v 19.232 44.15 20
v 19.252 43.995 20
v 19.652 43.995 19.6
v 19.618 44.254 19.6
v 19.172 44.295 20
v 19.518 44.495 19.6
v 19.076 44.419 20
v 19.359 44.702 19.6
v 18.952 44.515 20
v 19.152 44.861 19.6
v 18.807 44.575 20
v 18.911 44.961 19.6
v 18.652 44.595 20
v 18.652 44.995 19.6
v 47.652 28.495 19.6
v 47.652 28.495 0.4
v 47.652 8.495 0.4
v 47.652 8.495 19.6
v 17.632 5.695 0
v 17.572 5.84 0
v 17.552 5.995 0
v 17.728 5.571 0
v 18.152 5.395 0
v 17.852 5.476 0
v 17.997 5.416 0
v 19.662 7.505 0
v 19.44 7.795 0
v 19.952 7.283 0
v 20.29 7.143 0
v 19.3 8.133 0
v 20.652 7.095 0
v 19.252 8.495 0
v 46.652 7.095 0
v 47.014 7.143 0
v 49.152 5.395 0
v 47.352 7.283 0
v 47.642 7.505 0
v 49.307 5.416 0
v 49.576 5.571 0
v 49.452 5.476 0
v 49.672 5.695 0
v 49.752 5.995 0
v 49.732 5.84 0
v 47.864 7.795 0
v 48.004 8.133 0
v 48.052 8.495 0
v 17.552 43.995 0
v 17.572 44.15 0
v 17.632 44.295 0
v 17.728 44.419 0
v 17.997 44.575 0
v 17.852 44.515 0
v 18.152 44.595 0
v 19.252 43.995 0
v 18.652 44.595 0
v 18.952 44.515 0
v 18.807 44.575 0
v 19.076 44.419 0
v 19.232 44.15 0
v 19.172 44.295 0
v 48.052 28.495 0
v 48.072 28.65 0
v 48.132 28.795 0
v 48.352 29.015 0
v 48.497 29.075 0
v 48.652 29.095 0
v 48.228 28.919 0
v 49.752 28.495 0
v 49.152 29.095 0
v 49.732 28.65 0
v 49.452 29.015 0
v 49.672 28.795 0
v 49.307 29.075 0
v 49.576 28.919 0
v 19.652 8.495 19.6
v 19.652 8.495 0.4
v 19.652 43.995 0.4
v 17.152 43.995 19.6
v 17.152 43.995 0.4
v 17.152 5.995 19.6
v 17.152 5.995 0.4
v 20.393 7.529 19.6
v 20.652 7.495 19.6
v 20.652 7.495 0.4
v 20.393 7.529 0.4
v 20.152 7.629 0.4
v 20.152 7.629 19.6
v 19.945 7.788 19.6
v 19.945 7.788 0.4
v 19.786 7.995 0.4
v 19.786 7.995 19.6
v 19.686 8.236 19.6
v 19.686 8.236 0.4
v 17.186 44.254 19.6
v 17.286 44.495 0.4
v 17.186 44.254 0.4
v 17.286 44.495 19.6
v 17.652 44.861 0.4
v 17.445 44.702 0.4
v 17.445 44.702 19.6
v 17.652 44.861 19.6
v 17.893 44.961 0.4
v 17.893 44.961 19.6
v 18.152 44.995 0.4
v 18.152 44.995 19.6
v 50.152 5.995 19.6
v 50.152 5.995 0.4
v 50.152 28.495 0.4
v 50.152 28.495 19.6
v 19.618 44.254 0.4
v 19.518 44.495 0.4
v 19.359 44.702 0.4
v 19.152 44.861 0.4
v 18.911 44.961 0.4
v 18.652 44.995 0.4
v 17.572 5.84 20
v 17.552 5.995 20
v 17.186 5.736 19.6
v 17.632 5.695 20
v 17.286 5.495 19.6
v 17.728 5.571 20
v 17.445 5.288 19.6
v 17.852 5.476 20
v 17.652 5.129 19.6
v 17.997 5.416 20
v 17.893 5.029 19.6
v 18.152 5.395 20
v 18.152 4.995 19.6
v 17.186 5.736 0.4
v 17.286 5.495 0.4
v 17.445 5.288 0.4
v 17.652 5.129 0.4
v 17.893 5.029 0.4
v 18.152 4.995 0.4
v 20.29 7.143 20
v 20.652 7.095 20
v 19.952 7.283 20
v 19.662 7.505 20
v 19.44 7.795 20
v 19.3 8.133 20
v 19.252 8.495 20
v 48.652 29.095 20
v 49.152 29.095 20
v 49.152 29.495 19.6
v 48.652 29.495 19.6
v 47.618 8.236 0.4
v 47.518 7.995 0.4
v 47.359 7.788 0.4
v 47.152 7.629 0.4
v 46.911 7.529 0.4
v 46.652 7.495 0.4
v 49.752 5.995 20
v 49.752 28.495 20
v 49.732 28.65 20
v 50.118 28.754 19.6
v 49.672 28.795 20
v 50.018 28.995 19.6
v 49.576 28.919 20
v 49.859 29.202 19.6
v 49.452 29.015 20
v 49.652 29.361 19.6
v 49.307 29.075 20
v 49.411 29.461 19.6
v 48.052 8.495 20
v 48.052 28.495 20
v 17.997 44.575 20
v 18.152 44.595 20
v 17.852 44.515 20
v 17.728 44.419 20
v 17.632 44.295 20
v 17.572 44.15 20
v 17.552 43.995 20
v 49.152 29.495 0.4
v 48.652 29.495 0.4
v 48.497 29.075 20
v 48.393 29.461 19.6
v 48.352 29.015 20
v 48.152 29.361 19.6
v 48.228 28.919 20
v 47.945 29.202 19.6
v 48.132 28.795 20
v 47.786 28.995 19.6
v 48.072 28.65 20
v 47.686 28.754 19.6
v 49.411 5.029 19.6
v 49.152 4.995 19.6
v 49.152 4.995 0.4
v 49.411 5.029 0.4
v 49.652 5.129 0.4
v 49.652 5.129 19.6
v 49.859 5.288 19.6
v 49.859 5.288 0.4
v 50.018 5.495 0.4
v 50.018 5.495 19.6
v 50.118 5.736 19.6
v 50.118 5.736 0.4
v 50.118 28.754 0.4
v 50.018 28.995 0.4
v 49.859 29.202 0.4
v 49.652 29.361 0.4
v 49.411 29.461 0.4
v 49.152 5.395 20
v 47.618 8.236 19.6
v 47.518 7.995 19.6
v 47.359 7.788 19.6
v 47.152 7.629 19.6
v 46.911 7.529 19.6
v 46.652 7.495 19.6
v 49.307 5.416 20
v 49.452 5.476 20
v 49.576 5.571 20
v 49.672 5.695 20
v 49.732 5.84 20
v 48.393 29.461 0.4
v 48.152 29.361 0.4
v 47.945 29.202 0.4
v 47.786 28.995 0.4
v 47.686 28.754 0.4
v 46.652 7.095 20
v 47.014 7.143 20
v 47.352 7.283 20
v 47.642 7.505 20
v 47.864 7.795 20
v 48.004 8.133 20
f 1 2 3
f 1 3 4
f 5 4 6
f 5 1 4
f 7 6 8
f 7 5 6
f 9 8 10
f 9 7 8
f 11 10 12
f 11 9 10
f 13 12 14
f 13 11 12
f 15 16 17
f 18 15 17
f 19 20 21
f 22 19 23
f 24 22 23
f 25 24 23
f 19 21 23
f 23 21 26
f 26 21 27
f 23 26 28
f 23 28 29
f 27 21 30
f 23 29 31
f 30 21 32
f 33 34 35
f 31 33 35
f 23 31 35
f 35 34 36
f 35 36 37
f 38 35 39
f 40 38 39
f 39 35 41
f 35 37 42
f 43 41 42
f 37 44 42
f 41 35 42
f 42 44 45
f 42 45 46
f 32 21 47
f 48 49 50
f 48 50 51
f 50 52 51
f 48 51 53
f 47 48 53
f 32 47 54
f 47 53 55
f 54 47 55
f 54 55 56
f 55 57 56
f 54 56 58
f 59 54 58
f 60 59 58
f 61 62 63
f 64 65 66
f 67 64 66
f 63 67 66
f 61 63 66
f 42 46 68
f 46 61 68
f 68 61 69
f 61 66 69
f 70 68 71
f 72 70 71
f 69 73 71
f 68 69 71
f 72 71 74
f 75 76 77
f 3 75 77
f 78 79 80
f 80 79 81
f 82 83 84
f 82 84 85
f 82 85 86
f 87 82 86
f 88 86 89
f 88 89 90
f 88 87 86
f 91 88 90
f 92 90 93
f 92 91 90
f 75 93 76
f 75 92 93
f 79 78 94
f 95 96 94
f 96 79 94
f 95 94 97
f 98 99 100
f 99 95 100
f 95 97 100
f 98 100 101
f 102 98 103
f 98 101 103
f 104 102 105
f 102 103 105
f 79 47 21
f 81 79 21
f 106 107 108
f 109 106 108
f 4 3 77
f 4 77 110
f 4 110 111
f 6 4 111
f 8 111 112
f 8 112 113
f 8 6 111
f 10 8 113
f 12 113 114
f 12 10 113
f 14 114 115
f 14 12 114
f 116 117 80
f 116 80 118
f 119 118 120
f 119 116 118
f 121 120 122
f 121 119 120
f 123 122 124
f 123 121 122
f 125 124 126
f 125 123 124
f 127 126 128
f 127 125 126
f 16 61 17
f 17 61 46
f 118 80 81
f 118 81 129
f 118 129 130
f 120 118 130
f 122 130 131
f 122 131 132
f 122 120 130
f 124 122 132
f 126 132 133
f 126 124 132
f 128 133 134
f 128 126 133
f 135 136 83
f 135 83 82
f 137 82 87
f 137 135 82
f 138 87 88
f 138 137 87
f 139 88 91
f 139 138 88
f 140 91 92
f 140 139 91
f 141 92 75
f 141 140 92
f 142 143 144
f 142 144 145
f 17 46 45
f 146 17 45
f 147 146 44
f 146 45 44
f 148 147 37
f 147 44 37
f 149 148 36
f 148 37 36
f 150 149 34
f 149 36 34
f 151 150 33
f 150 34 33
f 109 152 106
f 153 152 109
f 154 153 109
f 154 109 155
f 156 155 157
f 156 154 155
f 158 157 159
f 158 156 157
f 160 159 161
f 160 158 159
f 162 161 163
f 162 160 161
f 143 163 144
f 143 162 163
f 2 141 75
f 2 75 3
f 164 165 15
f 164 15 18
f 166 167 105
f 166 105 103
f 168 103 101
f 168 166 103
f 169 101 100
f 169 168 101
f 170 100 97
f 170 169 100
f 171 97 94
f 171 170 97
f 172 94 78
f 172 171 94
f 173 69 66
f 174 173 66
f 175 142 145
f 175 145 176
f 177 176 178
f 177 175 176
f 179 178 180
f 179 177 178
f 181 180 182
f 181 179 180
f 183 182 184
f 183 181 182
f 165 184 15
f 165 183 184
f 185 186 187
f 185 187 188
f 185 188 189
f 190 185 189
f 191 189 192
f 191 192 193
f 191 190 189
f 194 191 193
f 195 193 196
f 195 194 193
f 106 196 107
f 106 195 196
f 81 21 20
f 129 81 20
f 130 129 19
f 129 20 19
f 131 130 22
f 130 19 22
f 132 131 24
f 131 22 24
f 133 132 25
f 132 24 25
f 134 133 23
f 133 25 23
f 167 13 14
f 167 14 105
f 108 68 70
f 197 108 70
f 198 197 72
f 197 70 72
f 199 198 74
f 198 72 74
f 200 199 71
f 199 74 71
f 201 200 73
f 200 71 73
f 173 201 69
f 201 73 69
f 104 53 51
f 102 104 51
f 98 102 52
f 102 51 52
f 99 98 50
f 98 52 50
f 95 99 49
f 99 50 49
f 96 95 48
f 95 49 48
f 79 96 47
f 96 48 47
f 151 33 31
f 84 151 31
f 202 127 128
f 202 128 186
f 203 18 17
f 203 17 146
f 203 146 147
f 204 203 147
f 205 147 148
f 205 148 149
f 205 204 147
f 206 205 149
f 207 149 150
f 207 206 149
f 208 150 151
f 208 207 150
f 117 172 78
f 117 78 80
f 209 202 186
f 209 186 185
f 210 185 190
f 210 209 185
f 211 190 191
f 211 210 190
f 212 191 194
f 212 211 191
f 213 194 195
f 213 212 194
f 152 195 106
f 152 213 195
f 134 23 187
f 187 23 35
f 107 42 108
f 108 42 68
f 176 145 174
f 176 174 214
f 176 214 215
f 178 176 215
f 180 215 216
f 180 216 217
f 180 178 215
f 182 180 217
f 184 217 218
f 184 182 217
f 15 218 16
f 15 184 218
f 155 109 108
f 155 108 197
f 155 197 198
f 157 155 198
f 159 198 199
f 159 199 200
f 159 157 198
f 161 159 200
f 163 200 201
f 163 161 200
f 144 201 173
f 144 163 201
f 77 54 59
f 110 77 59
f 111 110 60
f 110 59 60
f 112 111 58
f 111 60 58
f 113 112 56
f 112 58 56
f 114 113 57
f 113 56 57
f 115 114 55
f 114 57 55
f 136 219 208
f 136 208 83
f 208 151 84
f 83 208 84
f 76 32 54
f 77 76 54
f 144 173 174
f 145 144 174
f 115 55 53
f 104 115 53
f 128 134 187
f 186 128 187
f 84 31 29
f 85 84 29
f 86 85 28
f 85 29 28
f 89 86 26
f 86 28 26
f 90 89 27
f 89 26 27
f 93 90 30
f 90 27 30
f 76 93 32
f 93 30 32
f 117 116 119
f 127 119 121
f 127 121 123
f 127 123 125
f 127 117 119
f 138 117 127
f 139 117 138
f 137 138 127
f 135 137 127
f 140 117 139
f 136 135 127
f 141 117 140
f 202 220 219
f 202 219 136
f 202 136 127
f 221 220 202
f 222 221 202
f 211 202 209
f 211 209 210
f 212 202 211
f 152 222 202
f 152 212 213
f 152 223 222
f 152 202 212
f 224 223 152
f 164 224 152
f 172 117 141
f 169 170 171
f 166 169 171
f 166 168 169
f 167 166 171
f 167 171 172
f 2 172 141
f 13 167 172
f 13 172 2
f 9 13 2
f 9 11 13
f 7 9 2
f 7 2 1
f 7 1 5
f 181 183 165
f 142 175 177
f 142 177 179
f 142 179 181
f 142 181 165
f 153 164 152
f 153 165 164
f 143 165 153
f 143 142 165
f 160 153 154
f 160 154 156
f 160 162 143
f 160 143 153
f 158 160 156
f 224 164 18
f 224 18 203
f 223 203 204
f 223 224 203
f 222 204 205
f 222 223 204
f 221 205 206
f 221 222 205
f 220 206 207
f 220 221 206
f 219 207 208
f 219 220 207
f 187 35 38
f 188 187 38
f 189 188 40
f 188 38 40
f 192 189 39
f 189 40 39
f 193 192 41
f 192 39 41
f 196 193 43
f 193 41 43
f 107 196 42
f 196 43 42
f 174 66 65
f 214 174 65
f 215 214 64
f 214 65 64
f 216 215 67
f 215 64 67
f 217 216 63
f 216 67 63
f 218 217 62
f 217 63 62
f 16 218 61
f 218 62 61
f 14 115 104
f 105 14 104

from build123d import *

# Parameters (mm, degrees)
PAD_DEPTH    = 20
FILLET_R     = 1
CHAMFER_SIZE = 0.4


with BuildPart() as part:
    # Sketch → Pad (new body)
    with BuildSketch(Plane.XY):
        Polygon((17.151947, 44.9952), (17.151947, 4.9952), (50.151947, 4.9952), (50.151947, 29.4952), (47.651947, 29.4952), (47.651947, 7.4952), (19.651947, 7.4952), (19.651947, 44.9952), align=None)
    extrude(amount=PAD_DEPTH)

    # Fillet
    fillet_edges = [part.edges().sort_by_distance(p)[0] for p in [
        (50.151947, 4.9952, 10),
        (17.151947, 4.9952, 10),
        (19.651947, 7.4952, 10),
        (17.151947, 44.9952, 10),
        (19.651947, 44.9952, 10),
        (47.651947, 7.4952, 10),
        (47.651947, 29.4952, 10),
        (50.151947, 29.4952, 10),
    ]]
    fillet(fillet_edges, radius=FILLET_R)

    # Chamfer
    chamfer_edges = [part.edges().sort_by_distance(p)[0] for p in [
        (17.151947, 24.9952, 20),
        (17.44484, 44.702307, 20),
        (17.44484, 5.288093, 20),
        (18.401947, 44.9952, 20),
        (33.651947, 4.9952, 20),
        (19.359054, 44.702307, 20),
        (49.859054, 5.288093, 20),
        (19.651947, 26.2452, 20),
        (50.151947, 17.2452, 20),
        (19.94484, 7.788093, 20),
        (49.859054, 29.202307, 20),
        (33.651947, 7.4952, 20),
        (48.901947, 29.4952, 20),
        (47.359054, 7.788093, 20),
        (47.94484, 29.202307, 20),
        (47.651947, 18.4952, 20),
        (17.151947, 24.9952, 0),
        (17.44484, 44.702307, 0),
        (17.44484, 5.288093, 0),
        (18.401947, 44.9952, 0),
        (33.651947, 4.9952, 0),
        (19.359054, 44.702307, 0),
        (49.859054, 5.288093, 0),
        (19.651947, 26.2452, 0),
        (50.151947, 17.2452, 0),
        (19.94484, 7.788093, 0),
        (49.859054, 29.202307, 0),
        (33.651947, 7.4952, 0),
        (48.901947, 29.4952, 0),
        (47.359054, 7.788093, 0),
        (47.94484, 29.202307, 0),
        (47.651947, 18.4952, 0),
    ]]
    chamfer(chamfer_edges, length=CHAMFER_SIZE)


solid = part.part
